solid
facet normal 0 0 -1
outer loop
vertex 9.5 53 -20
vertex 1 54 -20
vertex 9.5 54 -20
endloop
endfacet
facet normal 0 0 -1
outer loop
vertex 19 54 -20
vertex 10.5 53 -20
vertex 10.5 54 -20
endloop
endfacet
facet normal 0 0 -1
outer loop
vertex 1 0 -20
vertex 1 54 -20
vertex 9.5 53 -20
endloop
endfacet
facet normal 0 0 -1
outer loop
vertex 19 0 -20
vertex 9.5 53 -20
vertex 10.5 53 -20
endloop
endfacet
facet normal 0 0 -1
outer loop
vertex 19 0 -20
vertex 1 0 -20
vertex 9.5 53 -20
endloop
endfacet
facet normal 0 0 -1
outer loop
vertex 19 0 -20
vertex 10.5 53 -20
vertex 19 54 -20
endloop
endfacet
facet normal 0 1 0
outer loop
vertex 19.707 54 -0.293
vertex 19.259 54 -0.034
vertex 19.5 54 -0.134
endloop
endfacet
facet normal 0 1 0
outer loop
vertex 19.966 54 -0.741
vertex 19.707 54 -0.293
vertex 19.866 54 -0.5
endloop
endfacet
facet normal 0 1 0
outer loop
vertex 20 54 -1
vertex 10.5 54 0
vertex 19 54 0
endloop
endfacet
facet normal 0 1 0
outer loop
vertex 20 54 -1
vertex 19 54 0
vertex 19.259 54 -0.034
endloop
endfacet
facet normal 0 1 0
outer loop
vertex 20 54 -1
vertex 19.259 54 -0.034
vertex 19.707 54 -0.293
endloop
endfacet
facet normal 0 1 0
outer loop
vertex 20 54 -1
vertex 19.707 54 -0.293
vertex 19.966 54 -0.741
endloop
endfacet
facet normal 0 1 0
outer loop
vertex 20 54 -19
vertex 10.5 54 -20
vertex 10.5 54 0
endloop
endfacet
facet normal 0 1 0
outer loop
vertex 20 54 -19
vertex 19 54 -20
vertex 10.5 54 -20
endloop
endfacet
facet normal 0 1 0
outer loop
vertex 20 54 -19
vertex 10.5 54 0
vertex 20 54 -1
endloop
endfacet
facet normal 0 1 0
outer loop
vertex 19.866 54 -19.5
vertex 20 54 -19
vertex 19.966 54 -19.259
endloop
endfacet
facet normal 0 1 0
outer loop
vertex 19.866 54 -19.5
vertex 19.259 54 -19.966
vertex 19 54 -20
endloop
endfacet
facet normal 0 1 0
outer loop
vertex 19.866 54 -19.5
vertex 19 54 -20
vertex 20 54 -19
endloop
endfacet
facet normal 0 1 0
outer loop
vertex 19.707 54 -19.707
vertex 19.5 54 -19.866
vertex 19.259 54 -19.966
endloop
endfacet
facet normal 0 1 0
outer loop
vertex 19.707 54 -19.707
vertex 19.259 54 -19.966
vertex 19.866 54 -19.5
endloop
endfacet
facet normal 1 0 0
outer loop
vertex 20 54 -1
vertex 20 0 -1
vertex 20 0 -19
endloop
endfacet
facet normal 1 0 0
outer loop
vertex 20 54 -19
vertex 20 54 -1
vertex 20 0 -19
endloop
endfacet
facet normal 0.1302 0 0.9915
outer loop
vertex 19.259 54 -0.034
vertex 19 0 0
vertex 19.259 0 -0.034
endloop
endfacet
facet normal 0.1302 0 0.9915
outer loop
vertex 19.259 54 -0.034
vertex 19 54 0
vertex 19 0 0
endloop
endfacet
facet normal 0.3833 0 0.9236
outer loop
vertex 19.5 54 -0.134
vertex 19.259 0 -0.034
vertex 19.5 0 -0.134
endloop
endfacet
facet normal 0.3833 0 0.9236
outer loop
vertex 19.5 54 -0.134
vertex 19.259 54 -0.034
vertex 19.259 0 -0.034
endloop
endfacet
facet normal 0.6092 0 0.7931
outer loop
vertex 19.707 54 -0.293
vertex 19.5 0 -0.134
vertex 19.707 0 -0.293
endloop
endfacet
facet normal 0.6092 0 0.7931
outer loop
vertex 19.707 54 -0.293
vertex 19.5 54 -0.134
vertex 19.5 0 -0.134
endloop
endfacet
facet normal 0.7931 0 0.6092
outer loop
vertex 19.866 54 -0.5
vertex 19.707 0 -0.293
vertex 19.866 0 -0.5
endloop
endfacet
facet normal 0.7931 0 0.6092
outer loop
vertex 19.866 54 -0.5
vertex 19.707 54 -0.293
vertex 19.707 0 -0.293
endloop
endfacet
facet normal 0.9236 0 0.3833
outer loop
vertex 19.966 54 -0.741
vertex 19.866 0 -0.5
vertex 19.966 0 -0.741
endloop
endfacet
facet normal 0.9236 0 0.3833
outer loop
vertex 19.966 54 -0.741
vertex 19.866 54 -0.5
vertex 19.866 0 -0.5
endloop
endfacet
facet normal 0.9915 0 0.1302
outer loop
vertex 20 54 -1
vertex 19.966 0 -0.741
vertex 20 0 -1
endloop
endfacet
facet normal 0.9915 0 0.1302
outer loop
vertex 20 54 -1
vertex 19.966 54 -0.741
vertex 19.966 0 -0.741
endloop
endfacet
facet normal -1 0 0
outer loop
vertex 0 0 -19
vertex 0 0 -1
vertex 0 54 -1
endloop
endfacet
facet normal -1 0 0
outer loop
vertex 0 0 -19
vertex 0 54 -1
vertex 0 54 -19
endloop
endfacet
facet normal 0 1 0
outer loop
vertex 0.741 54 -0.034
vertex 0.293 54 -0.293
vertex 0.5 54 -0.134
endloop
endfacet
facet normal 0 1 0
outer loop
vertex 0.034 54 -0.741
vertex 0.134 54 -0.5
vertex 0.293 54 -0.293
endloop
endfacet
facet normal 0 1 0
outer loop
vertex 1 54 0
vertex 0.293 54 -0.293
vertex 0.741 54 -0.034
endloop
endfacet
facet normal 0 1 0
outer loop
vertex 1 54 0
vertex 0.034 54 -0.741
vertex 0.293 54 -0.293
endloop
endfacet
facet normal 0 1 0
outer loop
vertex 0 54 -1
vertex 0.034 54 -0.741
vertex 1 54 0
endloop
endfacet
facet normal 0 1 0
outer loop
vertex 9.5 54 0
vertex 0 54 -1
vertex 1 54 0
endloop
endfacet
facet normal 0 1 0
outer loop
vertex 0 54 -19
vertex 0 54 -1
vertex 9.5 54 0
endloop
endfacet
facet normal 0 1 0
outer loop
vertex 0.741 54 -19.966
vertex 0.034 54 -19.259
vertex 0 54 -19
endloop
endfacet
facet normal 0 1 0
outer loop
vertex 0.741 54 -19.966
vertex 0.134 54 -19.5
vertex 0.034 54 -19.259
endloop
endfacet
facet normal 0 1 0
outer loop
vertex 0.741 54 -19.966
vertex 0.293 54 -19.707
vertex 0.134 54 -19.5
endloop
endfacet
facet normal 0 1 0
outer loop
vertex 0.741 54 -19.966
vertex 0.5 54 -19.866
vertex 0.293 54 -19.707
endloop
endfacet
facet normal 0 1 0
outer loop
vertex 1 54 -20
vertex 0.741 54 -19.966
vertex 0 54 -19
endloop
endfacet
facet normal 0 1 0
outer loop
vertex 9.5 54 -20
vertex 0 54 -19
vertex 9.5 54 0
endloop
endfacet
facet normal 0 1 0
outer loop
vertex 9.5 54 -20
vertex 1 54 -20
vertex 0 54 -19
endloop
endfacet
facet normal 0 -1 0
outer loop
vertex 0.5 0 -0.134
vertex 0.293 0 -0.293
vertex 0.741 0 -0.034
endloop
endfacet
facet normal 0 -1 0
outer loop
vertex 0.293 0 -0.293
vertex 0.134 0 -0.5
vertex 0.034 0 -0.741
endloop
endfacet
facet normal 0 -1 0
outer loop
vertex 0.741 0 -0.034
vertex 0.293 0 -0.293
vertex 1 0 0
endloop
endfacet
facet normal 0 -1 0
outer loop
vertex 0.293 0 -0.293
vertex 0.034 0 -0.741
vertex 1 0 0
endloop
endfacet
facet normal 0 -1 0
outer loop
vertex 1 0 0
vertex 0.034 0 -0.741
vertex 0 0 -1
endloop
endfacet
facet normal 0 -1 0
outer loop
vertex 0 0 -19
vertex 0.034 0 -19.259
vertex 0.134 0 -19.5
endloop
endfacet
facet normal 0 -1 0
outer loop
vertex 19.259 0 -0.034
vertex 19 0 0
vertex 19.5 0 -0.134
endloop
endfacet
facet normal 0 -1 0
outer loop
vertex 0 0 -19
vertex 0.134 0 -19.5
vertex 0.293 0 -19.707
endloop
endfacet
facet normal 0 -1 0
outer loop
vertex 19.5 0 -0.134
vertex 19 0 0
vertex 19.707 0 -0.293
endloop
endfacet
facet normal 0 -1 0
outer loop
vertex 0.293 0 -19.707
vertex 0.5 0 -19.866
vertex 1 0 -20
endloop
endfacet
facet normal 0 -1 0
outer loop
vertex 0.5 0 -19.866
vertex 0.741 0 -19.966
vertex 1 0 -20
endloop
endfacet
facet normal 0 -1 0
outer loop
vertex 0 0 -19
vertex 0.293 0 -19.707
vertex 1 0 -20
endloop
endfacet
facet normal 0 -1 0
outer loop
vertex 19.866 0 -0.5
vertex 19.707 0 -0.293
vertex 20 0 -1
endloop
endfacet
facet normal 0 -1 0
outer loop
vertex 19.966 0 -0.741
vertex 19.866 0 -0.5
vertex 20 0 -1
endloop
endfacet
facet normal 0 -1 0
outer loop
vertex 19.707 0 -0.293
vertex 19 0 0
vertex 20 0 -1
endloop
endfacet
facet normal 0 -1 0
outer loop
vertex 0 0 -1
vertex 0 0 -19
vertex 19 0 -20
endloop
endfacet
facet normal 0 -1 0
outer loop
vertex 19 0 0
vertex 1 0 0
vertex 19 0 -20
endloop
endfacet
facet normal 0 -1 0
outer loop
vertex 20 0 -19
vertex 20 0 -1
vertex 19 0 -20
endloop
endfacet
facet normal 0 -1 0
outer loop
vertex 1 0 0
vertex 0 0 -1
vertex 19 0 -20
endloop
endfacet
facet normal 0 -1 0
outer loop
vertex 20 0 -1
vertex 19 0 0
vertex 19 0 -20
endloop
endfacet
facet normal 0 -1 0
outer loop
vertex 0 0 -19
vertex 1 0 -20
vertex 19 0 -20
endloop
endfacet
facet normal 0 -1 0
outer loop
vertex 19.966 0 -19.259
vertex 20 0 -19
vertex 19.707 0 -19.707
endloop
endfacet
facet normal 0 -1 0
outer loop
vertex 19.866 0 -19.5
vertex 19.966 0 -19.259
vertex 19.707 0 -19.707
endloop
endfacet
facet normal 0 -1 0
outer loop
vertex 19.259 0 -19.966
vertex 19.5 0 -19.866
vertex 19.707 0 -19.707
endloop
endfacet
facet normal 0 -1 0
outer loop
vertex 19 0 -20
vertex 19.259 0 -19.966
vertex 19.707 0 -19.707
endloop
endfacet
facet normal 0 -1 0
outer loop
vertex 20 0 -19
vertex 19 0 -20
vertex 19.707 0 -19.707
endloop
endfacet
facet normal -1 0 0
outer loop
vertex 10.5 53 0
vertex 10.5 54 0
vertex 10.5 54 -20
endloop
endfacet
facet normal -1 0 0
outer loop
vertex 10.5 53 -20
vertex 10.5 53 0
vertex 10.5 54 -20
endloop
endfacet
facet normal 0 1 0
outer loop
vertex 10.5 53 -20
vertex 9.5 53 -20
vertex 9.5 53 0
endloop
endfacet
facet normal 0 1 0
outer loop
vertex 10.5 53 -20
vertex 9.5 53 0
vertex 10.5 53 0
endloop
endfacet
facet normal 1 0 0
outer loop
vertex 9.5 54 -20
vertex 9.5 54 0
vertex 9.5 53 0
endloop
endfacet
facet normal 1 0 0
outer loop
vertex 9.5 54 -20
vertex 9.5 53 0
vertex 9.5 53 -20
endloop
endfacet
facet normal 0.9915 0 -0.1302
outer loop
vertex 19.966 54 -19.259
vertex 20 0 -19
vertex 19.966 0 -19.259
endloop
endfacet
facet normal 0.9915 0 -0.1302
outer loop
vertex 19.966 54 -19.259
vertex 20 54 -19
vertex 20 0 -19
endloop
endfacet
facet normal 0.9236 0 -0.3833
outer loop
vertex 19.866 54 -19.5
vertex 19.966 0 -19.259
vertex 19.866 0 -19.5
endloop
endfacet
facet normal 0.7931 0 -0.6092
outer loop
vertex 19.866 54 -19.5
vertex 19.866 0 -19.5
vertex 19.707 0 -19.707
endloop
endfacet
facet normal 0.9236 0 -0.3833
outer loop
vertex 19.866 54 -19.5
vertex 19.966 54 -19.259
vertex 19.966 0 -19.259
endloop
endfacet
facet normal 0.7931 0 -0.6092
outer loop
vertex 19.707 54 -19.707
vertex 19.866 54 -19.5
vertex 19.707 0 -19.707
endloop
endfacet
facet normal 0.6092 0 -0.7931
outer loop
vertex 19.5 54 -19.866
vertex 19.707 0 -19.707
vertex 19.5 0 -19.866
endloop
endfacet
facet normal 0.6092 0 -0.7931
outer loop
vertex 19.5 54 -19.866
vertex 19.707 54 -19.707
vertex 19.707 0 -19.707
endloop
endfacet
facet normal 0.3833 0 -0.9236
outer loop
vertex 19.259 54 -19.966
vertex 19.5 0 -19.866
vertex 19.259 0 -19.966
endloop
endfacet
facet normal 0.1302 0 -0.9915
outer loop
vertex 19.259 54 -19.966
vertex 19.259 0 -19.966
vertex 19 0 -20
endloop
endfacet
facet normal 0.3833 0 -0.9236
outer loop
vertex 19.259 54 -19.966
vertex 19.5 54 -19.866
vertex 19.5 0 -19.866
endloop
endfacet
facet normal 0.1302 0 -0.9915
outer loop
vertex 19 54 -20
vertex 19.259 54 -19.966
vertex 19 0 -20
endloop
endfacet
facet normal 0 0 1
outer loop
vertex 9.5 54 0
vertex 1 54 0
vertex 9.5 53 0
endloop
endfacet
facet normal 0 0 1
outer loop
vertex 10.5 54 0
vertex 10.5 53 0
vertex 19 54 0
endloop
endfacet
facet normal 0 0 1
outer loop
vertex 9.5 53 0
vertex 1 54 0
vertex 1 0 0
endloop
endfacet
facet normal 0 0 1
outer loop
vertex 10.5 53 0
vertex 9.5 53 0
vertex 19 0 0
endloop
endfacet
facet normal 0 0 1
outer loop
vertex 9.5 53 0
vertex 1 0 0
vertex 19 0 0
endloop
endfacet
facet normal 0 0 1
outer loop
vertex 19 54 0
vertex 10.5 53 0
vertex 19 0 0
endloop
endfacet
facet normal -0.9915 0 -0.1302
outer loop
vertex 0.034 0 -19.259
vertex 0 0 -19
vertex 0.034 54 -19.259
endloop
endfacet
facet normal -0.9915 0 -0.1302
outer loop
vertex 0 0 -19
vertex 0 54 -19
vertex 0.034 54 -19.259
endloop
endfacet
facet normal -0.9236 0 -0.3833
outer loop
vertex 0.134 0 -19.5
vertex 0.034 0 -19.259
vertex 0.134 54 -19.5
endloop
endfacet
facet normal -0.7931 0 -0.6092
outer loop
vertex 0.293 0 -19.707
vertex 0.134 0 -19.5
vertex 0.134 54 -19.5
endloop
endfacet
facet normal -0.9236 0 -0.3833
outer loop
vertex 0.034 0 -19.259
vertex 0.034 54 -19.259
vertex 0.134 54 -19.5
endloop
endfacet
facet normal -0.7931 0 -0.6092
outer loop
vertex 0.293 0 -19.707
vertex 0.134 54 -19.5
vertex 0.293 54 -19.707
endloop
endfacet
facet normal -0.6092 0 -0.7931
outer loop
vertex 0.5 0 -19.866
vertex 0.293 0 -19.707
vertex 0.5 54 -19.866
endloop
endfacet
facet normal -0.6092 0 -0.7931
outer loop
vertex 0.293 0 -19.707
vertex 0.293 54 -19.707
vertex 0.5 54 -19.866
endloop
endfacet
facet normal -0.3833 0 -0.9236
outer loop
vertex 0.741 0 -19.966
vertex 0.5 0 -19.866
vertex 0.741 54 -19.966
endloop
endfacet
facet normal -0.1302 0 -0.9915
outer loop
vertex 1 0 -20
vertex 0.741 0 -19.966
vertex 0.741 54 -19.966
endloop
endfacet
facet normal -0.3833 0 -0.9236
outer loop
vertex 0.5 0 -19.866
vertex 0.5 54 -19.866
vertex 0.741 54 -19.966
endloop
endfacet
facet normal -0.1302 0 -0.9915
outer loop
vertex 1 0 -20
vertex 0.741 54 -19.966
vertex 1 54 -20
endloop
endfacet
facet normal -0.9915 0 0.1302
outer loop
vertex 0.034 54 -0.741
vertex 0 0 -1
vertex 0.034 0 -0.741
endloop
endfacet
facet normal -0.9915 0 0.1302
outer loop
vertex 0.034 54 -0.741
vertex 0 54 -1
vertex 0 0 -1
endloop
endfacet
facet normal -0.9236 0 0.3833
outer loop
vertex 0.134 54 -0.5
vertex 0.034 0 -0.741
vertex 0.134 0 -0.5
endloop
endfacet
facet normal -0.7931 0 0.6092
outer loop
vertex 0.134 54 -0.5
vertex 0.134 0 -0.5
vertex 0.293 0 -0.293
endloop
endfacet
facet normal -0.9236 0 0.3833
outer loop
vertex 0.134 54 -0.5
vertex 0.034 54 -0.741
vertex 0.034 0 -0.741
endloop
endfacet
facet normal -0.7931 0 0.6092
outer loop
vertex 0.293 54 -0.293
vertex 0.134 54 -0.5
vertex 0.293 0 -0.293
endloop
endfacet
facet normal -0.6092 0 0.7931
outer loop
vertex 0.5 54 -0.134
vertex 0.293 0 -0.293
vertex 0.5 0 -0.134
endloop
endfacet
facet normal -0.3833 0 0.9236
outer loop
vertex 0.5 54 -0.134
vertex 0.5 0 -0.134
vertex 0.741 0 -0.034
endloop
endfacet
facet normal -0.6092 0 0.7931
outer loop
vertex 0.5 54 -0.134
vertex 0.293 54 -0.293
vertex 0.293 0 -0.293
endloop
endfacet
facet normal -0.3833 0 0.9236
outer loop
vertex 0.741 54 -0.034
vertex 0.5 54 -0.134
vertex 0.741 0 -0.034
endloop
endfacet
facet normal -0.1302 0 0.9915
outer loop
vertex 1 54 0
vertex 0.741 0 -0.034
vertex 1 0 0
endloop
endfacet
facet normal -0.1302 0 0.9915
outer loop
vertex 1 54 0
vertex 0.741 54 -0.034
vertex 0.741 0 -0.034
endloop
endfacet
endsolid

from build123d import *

# Parameters (mm, degrees)
SKETCH_1_W          = 20
SKETCH_1_H          = 20
EXTRUDE_1_DEPTH     = 54
FILLET_1_R          = 1
SKETCH_2_W          = 1
SKETCH_2_H          = 20
CUT_EXTRUDE_1_DEPTH = 1


with BuildPart() as part:
    # 草图1 → 凸台-拉伸1 (new body)
    with BuildSketch(Plane(origin=(0, 0, 0), x_dir=(1, 0, 0), z_dir=(0, 1, 0))):
        with Locations((10, 10)):
            Rectangle(SKETCH_1_W, SKETCH_1_H)
    extrude(amount=EXTRUDE_1_DEPTH)

    # 圆角1
    fillet_1_edges = [part.edges().sort_by_distance(p)[0] for p in [
        (0, 27, -20),
        (20, 27, -20),
        (20, 27, 0),
        (0, 27, 0),
    ]]
    fillet(fillet_1_edges, radius=FILLET_1_R)

    # 草图2 → 切除-拉伸1 (cut)
    with BuildSketch(Plane(origin=(0, 54, 0), x_dir=(1, 0, 0), z_dir=(0, 1, 0))):
        with Locations((10, 10)):
            Rectangle(SKETCH_2_W, SKETCH_2_H)
    extrude(amount=-CUT_EXTRUDE_1_DEPTH, mode=Mode.SUBTRACT)


solid = part.part
